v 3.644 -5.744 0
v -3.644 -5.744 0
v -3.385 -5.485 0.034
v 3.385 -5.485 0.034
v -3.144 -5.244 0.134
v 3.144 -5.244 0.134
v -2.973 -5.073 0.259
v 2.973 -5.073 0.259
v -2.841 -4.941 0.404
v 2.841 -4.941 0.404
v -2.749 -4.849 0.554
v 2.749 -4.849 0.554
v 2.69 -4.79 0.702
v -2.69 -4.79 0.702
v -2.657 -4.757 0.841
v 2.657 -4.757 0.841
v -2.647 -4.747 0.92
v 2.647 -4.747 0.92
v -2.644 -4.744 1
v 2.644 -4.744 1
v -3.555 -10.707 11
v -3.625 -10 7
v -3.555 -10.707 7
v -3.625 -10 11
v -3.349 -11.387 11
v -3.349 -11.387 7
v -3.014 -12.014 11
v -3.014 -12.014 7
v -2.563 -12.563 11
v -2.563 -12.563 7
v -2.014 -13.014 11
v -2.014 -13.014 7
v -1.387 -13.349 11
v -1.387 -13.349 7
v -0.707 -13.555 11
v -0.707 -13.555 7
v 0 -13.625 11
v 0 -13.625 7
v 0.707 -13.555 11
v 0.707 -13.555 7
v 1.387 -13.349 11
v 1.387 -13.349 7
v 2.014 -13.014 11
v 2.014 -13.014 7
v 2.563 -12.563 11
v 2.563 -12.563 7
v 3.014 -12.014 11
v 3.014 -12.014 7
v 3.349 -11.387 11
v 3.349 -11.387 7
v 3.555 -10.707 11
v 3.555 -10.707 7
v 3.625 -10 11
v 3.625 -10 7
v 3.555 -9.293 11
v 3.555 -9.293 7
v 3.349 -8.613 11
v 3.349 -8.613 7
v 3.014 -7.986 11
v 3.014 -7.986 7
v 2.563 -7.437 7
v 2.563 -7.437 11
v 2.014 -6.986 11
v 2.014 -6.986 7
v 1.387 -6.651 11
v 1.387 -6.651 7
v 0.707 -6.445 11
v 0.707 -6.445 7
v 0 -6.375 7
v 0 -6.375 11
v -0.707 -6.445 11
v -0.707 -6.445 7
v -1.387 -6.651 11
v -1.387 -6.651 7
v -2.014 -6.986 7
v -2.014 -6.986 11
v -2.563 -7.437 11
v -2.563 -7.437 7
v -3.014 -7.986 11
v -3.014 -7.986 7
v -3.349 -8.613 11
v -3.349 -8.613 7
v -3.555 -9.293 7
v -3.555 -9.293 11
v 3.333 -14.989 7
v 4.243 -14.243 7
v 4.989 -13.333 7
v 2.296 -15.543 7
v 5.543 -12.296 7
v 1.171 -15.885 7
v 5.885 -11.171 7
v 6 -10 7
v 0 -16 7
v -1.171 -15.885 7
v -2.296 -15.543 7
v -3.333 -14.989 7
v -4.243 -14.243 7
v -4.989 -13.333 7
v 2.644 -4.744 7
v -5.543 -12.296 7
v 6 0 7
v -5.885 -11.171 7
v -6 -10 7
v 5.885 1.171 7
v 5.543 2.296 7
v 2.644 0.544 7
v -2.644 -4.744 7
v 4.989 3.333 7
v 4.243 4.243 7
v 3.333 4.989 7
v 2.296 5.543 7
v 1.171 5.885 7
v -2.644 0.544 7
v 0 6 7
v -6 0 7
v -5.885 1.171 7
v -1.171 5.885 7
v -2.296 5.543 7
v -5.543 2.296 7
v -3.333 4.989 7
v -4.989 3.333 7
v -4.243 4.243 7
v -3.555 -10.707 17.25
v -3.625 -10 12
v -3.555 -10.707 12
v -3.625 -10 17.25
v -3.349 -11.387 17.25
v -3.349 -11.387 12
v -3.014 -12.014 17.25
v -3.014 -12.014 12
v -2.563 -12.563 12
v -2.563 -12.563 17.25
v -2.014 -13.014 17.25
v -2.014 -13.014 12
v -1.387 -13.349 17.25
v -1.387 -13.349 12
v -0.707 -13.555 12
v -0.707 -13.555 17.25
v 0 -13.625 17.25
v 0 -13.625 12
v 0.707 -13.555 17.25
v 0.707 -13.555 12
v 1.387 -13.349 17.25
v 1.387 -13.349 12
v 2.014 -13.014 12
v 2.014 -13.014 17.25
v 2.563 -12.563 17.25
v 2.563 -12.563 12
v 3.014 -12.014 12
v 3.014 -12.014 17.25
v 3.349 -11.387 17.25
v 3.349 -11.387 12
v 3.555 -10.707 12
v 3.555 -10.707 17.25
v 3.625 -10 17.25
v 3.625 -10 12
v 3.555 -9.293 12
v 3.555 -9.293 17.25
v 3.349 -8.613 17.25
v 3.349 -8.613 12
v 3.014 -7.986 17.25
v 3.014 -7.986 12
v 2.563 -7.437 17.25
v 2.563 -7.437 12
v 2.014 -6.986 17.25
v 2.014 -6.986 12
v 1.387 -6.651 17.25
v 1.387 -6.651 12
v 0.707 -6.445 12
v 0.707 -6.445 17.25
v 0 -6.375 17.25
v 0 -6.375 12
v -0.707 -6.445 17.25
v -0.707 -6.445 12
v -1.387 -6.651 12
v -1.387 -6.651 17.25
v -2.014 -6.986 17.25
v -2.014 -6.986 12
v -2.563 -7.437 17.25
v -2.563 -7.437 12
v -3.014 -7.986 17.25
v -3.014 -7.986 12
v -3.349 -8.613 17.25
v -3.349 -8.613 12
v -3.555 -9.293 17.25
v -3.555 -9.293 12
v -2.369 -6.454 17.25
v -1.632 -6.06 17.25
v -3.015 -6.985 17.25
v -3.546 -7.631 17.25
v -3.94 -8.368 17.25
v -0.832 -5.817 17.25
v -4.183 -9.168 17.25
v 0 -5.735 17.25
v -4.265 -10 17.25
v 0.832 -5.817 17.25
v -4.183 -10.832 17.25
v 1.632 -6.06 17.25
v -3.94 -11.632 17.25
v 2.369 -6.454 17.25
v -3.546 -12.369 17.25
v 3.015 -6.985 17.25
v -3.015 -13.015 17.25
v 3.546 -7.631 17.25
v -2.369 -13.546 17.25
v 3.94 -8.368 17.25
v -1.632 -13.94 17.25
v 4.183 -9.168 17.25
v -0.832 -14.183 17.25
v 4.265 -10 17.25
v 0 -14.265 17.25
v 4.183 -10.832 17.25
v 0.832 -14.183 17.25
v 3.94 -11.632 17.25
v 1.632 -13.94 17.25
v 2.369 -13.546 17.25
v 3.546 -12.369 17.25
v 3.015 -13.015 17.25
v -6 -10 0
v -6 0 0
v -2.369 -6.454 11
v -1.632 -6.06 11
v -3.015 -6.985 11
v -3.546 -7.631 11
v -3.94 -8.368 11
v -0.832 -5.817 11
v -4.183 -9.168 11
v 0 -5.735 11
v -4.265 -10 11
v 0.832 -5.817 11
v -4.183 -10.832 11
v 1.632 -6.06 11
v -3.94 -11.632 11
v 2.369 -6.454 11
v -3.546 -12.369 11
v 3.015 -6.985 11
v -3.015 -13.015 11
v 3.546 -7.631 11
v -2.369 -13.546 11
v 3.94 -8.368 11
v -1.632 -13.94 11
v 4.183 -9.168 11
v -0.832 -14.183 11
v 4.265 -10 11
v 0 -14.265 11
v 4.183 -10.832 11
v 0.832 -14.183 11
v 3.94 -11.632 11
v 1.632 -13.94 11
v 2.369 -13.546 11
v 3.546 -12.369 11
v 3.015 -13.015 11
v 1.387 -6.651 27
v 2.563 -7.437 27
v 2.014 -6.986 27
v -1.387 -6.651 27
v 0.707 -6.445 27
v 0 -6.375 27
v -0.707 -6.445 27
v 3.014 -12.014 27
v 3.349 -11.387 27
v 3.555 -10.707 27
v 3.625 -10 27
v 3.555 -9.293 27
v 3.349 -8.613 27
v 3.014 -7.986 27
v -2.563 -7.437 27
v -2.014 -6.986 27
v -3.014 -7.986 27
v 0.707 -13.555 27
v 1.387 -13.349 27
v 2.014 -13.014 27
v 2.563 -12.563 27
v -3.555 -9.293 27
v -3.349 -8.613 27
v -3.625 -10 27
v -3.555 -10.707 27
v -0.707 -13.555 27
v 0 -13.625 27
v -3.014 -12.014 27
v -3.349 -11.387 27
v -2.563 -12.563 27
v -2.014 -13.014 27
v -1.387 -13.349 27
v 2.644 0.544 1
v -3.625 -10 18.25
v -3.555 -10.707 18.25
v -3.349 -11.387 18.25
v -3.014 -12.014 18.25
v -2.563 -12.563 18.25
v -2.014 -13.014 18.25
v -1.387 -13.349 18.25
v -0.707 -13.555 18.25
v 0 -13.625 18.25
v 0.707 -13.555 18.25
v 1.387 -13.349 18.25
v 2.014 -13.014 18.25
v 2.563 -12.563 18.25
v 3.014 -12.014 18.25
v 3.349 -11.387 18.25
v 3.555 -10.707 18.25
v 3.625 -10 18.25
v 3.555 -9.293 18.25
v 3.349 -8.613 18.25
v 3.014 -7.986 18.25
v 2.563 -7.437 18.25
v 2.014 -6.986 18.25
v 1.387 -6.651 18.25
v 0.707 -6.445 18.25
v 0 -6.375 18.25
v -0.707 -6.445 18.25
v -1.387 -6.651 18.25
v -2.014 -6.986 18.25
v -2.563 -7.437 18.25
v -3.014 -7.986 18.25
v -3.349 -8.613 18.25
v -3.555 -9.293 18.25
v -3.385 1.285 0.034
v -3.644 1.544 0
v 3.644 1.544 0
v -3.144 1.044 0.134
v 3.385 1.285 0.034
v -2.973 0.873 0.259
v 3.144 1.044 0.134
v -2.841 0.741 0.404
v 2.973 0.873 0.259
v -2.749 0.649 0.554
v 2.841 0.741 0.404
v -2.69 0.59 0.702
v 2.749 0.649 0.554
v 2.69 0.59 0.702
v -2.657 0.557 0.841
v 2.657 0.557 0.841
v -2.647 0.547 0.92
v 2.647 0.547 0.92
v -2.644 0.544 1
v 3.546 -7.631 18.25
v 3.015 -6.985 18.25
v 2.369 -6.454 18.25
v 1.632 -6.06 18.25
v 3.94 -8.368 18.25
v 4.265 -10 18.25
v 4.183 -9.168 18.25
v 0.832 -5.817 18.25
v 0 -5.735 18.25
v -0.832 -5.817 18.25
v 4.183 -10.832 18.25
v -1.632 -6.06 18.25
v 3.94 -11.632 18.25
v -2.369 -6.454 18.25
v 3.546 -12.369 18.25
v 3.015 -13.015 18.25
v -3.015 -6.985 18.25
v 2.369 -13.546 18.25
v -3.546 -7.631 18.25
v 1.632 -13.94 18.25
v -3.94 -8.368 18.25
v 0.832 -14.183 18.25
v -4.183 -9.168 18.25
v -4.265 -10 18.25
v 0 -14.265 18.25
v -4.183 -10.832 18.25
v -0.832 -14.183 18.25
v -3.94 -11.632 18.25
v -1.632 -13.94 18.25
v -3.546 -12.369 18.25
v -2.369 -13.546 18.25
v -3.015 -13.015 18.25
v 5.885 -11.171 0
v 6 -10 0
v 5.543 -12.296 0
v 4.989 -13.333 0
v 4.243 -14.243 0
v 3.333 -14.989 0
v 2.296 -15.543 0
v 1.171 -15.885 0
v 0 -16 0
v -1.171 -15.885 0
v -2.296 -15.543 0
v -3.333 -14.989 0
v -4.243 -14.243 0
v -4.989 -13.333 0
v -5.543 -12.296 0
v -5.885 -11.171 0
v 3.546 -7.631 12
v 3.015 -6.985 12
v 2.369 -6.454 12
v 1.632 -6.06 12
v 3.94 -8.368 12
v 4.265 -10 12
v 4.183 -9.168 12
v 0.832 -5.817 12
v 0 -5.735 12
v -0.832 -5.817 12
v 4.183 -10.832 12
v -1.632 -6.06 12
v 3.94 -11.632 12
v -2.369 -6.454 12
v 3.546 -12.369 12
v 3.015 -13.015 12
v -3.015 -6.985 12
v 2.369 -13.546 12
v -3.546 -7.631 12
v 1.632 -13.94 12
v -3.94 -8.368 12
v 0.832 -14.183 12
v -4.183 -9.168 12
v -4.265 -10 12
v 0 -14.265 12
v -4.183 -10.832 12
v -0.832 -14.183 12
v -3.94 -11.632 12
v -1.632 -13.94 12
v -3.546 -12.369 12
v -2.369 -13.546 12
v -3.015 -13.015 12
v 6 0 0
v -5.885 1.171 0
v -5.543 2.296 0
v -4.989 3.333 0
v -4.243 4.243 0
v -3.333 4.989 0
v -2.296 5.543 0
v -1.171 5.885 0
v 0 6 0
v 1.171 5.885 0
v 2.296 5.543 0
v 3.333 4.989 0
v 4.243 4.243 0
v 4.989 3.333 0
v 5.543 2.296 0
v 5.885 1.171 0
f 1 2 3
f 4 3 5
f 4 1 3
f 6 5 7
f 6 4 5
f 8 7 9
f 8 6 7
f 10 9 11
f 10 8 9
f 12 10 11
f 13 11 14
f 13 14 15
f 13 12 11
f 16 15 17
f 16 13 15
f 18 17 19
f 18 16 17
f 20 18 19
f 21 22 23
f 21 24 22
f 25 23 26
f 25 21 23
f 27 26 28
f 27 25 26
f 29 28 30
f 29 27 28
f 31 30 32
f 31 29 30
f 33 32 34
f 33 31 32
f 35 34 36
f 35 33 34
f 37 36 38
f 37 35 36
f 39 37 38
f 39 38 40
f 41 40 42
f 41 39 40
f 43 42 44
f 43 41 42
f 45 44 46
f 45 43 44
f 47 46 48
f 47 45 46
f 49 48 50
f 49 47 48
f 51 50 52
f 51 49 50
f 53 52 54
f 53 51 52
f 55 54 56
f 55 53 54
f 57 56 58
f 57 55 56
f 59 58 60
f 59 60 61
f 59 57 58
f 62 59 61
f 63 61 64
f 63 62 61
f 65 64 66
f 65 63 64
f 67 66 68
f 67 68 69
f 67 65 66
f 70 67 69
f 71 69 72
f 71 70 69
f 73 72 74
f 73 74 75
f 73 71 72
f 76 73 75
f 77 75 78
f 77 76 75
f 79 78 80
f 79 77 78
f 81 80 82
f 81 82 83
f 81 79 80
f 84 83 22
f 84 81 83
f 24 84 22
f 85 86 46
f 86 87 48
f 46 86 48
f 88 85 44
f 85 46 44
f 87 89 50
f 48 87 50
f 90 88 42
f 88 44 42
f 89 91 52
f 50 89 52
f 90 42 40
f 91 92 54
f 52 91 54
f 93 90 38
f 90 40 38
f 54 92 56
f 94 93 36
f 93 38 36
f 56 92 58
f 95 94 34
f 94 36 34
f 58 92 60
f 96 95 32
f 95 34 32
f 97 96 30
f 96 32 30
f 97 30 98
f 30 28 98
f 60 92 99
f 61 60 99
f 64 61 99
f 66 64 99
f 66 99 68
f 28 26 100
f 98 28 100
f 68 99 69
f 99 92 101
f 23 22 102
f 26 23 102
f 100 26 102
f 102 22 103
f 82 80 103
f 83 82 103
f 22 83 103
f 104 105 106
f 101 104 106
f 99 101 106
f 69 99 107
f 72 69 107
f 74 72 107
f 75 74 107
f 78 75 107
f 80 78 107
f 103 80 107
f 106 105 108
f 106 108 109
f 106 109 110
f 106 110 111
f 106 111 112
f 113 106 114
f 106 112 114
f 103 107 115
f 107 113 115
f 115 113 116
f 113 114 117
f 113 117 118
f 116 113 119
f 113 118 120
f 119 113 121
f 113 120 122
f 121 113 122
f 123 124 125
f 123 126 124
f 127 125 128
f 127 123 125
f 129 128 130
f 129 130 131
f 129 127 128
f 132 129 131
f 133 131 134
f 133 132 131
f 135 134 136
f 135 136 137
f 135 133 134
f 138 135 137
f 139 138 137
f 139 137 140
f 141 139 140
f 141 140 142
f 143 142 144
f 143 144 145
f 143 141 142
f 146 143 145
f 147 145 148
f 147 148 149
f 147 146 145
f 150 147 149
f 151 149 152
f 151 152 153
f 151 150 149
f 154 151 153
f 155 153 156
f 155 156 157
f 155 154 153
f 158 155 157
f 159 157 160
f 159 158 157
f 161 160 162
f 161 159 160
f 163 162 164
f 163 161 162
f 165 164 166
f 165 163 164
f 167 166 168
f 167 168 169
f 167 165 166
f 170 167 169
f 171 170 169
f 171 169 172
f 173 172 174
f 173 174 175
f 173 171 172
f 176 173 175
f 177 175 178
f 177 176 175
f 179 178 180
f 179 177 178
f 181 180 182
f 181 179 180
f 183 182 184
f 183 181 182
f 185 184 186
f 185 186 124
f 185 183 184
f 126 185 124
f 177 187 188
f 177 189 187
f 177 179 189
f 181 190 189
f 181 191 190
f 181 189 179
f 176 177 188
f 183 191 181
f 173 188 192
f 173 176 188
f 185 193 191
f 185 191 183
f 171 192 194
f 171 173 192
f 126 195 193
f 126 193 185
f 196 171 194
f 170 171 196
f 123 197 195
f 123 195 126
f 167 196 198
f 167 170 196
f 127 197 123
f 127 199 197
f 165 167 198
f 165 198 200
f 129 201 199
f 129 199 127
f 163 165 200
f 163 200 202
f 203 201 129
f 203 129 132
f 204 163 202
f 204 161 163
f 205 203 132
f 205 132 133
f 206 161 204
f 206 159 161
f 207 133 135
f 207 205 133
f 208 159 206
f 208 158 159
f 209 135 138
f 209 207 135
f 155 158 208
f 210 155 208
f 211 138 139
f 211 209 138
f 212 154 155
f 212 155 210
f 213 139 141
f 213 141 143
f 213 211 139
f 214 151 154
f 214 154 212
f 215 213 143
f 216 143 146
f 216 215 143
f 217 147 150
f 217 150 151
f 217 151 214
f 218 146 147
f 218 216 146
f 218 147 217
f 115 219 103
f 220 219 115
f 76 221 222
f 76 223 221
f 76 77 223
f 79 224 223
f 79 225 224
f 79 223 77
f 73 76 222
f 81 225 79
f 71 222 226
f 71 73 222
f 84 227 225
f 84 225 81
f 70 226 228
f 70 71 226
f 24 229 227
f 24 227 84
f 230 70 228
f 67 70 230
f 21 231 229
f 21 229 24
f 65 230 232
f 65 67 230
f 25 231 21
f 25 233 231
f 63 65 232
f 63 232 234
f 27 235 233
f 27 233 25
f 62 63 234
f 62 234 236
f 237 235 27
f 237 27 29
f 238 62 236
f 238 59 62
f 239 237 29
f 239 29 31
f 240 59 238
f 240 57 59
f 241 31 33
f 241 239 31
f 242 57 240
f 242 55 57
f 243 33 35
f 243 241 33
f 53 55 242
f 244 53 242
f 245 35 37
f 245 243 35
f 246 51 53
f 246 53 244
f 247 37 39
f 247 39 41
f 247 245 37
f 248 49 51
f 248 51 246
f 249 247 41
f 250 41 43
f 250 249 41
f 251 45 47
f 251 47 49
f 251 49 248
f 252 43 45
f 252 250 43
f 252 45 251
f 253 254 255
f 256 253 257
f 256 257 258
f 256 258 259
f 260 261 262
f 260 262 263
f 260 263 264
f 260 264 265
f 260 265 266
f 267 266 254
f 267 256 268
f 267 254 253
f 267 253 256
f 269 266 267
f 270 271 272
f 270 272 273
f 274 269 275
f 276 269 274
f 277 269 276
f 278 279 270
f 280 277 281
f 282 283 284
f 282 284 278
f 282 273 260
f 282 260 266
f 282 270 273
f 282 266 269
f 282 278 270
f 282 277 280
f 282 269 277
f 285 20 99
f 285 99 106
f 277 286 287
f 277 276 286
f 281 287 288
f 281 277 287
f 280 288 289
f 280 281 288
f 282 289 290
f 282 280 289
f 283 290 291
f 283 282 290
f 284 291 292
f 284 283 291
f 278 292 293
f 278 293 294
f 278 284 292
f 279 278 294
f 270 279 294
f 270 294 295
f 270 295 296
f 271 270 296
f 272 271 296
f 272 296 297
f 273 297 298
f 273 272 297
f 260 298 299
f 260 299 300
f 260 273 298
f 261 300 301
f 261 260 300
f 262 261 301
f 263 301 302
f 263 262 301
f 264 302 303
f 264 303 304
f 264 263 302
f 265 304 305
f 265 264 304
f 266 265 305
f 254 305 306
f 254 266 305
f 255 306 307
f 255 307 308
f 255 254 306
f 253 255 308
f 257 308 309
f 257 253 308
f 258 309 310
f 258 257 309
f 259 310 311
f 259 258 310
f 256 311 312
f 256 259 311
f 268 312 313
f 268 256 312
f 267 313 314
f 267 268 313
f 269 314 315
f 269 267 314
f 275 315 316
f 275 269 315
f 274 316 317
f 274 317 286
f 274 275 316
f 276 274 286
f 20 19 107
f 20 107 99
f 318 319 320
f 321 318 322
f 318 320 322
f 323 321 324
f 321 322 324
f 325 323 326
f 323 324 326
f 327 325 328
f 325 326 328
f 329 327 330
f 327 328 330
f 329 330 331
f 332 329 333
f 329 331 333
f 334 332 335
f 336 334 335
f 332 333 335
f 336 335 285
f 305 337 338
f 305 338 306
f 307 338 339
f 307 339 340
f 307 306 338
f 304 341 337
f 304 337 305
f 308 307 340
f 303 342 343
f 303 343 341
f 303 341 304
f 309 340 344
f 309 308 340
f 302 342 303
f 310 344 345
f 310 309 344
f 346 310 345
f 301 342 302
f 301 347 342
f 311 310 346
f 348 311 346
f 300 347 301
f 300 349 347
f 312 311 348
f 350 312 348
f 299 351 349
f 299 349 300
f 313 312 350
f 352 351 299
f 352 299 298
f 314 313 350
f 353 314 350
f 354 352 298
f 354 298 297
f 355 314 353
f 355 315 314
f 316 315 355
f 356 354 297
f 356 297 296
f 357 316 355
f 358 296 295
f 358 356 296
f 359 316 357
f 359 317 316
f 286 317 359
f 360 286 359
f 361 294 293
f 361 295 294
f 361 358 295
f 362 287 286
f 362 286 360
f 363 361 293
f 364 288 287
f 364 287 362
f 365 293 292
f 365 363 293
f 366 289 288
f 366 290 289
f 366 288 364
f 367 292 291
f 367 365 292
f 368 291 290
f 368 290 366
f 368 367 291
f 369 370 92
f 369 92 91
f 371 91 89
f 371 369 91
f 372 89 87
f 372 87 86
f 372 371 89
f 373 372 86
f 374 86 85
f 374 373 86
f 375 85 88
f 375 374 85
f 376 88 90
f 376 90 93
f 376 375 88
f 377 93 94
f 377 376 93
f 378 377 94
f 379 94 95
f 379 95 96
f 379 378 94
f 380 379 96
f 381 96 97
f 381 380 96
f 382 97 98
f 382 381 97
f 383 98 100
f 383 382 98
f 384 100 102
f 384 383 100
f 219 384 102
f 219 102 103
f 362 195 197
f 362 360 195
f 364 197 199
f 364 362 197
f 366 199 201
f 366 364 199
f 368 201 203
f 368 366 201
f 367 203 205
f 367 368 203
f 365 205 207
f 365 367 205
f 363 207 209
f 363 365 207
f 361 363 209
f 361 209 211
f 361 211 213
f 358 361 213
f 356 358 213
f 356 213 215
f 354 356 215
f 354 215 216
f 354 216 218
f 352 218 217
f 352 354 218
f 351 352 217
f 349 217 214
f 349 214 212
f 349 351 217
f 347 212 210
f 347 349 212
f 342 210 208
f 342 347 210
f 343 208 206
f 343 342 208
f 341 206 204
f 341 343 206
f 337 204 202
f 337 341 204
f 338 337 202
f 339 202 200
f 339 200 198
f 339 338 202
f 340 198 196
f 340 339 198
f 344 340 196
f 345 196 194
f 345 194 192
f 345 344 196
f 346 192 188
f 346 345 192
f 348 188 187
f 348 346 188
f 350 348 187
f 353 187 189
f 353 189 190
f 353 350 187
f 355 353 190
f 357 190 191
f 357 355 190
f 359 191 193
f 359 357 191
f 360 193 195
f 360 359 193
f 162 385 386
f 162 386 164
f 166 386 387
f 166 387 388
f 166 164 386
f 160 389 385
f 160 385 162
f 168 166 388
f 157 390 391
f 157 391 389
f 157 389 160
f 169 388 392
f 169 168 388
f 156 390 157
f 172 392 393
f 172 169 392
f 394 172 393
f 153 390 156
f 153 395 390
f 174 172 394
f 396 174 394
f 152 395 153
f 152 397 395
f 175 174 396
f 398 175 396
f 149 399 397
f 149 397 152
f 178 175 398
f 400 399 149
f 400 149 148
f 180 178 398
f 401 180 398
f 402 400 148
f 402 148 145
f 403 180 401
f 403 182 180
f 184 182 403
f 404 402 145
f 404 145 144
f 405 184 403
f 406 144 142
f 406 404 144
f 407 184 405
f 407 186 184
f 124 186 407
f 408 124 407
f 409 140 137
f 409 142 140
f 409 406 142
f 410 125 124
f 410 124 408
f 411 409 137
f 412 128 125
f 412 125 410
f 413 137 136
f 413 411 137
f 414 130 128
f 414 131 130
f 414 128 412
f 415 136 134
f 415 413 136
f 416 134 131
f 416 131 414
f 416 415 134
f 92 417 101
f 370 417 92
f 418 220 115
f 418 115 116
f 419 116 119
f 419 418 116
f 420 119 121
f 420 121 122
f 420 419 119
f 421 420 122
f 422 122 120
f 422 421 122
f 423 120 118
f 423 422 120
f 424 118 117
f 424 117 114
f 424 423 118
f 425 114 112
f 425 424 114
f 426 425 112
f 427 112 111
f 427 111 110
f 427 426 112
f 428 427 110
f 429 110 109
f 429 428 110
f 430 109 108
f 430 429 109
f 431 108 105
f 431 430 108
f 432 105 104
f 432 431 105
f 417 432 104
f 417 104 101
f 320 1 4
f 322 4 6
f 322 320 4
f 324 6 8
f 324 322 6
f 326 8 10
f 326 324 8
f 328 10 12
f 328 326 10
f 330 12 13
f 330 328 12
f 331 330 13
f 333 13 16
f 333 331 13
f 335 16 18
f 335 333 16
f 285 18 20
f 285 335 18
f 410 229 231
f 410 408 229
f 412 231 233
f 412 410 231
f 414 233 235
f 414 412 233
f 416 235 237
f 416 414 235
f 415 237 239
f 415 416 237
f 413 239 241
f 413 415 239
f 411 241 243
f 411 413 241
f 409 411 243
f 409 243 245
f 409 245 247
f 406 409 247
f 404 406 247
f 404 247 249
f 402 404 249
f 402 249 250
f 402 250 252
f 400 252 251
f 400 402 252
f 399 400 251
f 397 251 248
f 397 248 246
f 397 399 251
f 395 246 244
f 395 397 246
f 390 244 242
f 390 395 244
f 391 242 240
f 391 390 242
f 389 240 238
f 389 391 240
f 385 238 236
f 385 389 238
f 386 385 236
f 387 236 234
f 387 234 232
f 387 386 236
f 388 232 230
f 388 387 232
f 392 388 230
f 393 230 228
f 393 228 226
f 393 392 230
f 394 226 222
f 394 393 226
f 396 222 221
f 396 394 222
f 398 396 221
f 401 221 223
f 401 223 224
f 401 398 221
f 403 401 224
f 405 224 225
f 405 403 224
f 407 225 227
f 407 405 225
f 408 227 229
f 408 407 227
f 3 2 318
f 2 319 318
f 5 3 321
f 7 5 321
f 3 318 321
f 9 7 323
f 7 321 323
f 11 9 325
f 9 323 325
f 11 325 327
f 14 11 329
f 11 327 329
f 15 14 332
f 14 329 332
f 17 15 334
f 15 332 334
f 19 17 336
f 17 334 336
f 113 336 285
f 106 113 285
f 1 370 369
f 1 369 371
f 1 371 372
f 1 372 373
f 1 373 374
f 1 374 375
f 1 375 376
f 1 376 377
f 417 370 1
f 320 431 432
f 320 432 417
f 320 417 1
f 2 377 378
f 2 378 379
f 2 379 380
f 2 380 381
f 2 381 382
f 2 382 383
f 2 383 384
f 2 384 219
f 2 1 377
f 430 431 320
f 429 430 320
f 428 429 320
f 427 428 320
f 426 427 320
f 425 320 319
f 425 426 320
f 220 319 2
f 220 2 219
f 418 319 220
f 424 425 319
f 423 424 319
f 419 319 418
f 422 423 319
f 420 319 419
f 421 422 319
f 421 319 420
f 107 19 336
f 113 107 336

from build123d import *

# Parameters (mm, degrees)
SKETCH1_W           = 5.288
SKETCH1_H           = 5.288
BOSS_EXTRUDE1_DEPTH = 7
FILLET1_R           = 1


with BuildPart() as part:
    # Sketch1 → Boss-Extrude1 (new body)
    with BuildSketch(Plane.XY):
        with BuildLine():
            Line((6, 0), (6, -10))
            ThreePointArc((6, -10), (0, -16), (-6, -10))
            Line((-6, -10), (-6, 0))
            ThreePointArc((-6, 0), (0, 6), (6, 0))
        make_face()
        with Locations((0, -2.1)):
            Rectangle(SKETCH1_W, SKETCH1_H, mode=Mode.SUBTRACT)
    extrude(amount=BOSS_EXTRUDE1_DEPTH)

    # Sketch4 → Revolve1 (revolve)
    with BuildSketch(Plane(origin=(0, 0, 0), x_dir=(0, 0, -1), z_dir=(1, 0, 0)), mode=Mode.PRIVATE) as revolve1_sk:
        Polygon((-7, -13.625), (-11, -13.625), (-11, -14.264510891), (-12, -14.264510891), (-12, -13.625), (-17.25, -13.625), (-17.25, -14.264510891), (-18.25, -14.264510891), (-18.25, -13.625), (-27, -13.625), (-27, -10), (-7, -10), align=None)
    revolve(revolve1_sk.sketch.rotate(Axis((0, -10, 7), (0, 0, 1)), 270), axis=Axis((0, -10, 7), (0, 0, 1)))

    # Fillet1
    fillet1_edges = [part.edges().sort_by_distance(p)[0] for p in [
        (2.644, -2.1, 0),
        (0, 0.544, 0),
        (-2.644, -2.1, 0),
        (0, -4.744, 0),
    ]]
    fillet(fillet1_edges, radius=FILLET1_R)


solid = part.part
